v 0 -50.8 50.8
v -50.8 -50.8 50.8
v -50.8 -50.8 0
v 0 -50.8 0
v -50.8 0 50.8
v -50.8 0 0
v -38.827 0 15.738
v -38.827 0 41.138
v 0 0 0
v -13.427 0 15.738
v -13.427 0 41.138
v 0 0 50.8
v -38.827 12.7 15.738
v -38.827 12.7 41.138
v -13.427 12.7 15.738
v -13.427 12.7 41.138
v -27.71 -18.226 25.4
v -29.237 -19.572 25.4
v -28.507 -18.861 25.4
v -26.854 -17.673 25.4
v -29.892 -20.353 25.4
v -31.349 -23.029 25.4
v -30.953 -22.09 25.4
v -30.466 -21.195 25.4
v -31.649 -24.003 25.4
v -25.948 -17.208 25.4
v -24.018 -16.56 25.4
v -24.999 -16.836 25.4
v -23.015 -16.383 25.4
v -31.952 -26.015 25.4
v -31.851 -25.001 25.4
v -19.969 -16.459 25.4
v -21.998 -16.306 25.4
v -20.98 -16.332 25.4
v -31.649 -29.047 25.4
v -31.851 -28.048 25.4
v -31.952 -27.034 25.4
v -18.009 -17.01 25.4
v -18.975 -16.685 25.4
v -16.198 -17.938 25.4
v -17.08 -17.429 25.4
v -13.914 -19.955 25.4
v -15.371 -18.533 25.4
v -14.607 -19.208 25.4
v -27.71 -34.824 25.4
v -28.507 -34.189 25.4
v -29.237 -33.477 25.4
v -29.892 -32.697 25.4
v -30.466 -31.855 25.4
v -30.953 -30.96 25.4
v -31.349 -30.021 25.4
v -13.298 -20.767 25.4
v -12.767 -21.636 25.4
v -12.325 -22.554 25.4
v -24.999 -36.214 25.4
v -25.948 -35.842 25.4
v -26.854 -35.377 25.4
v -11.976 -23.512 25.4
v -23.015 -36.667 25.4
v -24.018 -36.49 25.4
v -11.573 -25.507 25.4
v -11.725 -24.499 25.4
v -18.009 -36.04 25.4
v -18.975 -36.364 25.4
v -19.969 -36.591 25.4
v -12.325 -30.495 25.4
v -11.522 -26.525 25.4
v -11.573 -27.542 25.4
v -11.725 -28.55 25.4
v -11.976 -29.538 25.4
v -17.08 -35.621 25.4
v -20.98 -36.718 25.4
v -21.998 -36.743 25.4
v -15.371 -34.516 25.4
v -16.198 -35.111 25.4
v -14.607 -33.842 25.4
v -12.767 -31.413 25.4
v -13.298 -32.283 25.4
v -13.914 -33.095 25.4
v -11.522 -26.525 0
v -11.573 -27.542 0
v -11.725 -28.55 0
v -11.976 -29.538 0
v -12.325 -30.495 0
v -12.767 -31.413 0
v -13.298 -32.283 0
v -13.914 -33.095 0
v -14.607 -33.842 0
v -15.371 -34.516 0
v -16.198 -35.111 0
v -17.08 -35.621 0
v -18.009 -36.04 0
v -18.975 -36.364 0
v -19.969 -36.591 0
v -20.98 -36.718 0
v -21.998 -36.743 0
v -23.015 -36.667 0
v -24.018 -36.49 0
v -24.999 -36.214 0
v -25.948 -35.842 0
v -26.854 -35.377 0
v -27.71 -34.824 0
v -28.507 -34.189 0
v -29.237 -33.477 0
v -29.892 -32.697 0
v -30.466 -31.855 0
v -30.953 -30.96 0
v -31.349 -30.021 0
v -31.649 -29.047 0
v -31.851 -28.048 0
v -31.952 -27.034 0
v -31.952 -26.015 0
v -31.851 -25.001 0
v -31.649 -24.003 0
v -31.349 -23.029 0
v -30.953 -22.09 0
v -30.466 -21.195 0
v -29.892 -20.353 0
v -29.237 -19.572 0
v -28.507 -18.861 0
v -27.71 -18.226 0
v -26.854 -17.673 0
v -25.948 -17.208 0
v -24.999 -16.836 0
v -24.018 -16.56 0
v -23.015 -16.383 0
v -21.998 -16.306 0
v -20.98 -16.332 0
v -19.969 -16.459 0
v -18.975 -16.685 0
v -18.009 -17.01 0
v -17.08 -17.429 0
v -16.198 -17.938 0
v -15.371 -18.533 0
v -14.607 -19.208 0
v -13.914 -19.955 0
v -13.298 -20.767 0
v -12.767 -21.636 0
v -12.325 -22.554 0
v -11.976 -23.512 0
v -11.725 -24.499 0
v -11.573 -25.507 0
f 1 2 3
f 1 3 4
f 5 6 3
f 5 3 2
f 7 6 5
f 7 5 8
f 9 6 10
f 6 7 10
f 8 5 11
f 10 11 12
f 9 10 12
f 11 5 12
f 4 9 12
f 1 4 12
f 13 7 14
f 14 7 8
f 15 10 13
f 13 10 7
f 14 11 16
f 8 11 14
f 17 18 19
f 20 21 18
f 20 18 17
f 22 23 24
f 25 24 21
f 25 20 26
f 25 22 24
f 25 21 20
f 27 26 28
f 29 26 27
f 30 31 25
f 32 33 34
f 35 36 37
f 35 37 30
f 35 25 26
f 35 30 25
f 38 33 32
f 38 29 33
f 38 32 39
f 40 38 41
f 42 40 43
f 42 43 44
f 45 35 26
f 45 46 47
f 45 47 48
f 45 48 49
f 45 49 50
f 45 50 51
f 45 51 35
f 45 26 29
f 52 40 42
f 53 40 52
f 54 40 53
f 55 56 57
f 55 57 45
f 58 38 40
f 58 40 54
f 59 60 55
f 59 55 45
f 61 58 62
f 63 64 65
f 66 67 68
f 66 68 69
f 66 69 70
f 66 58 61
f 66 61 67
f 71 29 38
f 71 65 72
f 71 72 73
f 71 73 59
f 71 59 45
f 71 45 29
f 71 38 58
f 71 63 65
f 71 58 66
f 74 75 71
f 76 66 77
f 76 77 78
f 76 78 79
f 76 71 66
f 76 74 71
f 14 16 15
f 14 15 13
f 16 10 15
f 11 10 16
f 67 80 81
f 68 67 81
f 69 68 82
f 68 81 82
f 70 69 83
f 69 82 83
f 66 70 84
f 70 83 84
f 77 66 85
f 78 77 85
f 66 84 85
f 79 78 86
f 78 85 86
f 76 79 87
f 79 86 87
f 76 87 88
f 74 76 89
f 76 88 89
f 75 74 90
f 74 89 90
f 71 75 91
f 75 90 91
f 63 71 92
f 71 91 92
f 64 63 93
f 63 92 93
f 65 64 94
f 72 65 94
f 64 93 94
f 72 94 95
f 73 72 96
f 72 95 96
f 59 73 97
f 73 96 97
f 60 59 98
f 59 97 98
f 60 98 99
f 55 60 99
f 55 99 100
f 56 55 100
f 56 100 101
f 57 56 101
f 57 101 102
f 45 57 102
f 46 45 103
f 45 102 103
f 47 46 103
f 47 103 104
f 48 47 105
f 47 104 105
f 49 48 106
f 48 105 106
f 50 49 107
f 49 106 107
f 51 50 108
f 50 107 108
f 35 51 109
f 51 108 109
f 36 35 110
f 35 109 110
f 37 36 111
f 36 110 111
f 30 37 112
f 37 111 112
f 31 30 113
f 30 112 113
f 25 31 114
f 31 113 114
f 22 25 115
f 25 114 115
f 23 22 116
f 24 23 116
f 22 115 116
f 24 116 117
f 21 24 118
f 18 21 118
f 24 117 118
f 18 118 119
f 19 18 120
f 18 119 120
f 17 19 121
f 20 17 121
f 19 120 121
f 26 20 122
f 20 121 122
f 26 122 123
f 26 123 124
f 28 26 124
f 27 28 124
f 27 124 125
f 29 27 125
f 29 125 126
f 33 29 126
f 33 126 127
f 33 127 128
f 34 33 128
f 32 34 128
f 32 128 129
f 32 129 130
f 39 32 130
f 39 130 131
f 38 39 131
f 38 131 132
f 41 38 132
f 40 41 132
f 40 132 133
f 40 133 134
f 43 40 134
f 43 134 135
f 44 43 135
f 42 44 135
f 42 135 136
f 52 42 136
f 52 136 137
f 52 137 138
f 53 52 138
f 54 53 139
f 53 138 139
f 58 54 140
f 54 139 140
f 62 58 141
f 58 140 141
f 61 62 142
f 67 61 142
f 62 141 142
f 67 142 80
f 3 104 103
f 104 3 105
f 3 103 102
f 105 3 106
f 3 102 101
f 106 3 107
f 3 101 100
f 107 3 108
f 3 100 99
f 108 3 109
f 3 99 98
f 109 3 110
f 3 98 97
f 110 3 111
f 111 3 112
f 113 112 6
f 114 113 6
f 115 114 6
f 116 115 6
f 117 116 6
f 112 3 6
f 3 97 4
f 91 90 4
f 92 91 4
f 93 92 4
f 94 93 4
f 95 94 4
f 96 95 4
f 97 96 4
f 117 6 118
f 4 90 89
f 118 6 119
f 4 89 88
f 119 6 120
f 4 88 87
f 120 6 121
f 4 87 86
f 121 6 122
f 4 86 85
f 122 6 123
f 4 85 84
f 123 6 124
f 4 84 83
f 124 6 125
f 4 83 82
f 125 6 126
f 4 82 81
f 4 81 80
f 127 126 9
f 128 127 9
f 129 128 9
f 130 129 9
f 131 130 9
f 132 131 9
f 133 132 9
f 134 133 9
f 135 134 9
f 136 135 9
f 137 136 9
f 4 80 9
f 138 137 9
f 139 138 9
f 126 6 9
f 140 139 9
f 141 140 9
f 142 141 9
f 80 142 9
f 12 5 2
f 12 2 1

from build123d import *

# Parameters (mm, degrees)
F0_W     = 50.8
F0_H     = 50.8
F1_DEPTH = 50.8
F2_W     = 25.4
F2_H     = 25.4
F3_DEPTH = 12.7
F4_R     = 10.22151
F5_DEPTH = 25.4


with BuildPart() as f1:
    # F0 (on Front) → F1 (new body)
    with BuildSketch(Plane.XZ):
        with Locations((-25.4, 25.4)):
            Rectangle(F0_W, F0_H)
    extrude(amount=F1_DEPTH)

    # F2 (on face) → F3 (join)
    with BuildSketch(Plane(origin=(0, 0, 0), x_dir=(-1, 0, 0), z_dir=(0, 1, 0))):
        with Locations((26.126995, 28.438128)):
            Rectangle(F2_W, F2_H)
    extrude(amount=F3_DEPTH)

    # F4 (on face) → F5 (cut)
    with BuildSketch(Plane(origin=(0, 0, 0), x_dir=(1, 0, 0), z_dir=(0, 0, -1))):
        with Locations((-21.743661, 26.524765)):
            Circle(F4_R)
    extrude(amount=-F5_DEPTH, mode=Mode.SUBTRACT)


solid = f1.part
